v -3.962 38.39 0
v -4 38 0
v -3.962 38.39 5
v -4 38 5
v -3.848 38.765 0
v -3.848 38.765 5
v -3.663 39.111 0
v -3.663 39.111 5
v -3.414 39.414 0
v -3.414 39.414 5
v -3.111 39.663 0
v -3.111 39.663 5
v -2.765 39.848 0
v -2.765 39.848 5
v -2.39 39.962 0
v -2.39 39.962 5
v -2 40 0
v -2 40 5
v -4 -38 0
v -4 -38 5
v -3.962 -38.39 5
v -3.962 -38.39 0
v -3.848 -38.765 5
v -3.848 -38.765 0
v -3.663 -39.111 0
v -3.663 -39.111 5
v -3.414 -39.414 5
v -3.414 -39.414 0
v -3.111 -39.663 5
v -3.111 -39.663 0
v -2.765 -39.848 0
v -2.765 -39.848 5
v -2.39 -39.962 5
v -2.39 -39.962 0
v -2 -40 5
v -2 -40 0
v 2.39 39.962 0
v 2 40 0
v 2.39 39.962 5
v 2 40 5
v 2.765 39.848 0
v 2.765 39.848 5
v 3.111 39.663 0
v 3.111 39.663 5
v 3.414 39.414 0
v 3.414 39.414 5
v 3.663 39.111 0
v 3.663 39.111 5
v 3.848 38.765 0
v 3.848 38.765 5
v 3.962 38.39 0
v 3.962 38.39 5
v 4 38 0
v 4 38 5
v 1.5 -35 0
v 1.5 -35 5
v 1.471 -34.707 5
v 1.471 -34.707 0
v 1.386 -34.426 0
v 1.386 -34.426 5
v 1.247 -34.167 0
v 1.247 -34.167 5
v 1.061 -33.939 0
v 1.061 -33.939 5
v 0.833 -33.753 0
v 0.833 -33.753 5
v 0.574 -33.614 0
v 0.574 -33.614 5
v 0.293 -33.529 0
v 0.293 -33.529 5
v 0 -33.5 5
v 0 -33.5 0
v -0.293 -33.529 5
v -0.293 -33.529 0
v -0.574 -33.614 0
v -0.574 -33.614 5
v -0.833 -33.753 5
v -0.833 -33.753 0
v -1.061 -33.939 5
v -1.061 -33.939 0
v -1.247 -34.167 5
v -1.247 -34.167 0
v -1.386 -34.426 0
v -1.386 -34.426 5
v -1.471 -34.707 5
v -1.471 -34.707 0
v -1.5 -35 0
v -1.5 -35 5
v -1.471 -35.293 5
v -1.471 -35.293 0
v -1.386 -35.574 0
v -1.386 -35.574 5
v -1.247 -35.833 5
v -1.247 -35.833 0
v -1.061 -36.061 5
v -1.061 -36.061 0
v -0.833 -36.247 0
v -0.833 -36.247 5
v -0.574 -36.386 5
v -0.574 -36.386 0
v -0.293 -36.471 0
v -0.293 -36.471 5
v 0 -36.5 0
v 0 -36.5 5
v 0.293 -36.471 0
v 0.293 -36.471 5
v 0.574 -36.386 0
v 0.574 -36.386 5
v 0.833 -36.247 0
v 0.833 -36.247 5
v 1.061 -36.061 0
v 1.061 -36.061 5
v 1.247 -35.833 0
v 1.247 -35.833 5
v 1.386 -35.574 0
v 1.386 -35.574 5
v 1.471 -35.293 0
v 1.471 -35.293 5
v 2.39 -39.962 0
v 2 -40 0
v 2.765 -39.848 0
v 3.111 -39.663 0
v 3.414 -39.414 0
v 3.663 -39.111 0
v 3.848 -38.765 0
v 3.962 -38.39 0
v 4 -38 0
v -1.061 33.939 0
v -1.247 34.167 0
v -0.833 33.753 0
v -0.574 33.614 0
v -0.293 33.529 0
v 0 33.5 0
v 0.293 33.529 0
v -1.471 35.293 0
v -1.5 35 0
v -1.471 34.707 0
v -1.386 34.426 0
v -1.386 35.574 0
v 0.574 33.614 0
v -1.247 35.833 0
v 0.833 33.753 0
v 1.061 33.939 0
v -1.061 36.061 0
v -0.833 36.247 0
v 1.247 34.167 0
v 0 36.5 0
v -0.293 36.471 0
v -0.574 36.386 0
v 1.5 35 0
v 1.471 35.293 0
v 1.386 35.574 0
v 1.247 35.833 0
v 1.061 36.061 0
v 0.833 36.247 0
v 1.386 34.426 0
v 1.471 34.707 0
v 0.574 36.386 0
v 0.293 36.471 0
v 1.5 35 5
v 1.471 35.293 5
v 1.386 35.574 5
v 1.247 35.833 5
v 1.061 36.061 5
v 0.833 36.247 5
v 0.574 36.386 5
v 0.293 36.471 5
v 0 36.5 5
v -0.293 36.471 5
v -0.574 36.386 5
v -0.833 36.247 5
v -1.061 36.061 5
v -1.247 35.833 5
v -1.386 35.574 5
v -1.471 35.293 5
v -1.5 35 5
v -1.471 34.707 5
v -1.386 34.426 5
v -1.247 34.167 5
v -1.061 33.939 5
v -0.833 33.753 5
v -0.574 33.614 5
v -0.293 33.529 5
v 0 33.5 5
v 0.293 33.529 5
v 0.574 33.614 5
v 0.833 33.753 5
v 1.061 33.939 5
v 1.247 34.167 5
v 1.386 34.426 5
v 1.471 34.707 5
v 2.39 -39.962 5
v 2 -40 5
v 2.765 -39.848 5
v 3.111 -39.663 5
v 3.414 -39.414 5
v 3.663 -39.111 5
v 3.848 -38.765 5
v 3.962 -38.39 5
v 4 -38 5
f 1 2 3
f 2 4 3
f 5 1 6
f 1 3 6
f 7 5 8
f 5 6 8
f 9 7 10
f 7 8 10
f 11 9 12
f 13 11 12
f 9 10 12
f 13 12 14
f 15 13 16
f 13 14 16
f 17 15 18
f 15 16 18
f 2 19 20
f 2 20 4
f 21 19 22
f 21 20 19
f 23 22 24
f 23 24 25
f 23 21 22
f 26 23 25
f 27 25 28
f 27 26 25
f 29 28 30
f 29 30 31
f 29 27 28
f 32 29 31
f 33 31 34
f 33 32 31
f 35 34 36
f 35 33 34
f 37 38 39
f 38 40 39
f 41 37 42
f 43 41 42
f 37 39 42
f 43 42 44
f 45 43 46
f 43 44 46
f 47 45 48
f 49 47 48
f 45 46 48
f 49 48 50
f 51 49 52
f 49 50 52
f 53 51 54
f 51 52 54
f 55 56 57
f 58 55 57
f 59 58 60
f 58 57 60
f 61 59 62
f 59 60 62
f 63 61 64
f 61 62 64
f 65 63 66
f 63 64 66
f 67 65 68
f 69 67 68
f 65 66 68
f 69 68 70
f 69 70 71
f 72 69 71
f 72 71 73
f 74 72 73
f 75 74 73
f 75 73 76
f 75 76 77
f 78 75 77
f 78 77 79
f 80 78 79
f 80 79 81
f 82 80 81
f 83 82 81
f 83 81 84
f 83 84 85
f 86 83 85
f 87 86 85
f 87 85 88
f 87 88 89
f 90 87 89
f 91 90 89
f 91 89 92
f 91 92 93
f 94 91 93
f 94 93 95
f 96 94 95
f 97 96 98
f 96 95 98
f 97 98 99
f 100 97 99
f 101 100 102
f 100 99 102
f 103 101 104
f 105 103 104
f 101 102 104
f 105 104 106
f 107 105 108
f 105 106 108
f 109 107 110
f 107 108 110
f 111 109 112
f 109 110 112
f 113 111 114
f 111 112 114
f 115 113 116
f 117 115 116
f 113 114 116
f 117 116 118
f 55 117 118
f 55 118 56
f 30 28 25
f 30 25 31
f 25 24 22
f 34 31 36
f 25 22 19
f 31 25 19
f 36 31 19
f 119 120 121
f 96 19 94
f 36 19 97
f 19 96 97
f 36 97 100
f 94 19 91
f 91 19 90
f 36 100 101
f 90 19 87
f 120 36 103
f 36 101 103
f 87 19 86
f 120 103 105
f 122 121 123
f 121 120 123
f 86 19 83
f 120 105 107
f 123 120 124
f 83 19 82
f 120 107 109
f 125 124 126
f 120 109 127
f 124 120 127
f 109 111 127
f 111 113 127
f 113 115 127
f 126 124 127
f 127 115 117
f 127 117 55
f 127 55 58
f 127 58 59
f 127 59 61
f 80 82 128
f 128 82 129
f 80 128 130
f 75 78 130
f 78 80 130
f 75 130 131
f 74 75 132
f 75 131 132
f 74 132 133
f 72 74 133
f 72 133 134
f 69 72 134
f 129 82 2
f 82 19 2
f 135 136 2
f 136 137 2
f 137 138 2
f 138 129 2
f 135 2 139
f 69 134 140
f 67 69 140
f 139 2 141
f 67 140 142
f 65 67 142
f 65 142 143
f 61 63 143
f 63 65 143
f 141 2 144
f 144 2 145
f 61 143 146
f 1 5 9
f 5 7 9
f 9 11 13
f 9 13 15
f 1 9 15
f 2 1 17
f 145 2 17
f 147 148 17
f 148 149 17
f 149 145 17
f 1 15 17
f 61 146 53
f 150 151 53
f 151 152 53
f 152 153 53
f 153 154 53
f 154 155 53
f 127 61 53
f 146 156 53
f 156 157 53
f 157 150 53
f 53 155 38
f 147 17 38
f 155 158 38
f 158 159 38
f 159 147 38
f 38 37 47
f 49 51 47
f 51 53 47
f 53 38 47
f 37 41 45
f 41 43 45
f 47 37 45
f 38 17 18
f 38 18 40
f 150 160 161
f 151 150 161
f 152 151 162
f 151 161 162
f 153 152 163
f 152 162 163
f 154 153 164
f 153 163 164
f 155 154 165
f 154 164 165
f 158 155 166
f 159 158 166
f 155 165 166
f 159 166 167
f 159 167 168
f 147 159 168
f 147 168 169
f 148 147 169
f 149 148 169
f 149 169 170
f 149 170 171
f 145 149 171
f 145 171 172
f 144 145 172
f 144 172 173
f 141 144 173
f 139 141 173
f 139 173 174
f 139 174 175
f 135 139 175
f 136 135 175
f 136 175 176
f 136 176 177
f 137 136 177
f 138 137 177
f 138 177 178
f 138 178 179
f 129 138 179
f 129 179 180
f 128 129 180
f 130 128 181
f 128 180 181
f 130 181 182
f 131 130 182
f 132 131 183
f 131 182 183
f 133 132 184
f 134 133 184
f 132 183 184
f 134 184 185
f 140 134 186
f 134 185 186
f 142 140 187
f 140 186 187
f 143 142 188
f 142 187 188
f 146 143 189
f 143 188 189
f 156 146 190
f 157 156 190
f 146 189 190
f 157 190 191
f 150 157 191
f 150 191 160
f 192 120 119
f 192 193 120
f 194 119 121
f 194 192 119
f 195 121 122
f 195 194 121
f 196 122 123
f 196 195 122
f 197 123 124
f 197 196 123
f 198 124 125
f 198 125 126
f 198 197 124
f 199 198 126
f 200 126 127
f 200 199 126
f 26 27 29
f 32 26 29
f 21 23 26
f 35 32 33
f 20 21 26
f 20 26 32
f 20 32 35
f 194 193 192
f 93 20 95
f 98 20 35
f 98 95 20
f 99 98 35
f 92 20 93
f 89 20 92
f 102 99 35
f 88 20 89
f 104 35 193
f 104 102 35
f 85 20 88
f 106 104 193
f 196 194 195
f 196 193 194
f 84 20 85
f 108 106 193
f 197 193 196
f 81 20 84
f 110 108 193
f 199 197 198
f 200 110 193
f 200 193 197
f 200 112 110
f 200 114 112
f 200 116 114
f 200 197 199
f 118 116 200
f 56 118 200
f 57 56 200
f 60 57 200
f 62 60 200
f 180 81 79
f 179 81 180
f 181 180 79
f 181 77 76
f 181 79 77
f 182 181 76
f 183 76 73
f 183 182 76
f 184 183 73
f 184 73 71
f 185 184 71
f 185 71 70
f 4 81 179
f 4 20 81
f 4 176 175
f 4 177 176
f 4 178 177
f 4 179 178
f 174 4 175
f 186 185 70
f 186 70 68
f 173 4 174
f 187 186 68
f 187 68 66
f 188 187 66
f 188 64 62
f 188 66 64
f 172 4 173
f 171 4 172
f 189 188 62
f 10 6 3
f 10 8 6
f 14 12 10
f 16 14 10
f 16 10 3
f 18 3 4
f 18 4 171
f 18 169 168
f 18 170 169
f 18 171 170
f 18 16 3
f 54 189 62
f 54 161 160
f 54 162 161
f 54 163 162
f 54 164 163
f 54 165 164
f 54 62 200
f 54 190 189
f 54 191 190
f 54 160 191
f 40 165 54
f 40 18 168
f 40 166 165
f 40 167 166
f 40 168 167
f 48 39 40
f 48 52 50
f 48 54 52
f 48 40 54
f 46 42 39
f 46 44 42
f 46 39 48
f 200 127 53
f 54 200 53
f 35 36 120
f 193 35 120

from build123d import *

# Parameters (mm, degrees)
SKETCH_1_W          = 8
SKETCH_1_H          = 80
EXTRUDE_1_DEPTH     = 5
SKETCH_2_R          = 1.5
CUT_EXTRUDE_1_DEPTH = 41.509258201
FILLET_1_R          = 2


with BuildPart() as part:
    # 草图1 → 凸台-拉伸1 (new body)
    with BuildSketch(Plane.XY):
        Rectangle(SKETCH_1_W, SKETCH_1_H)
    extrude(amount=EXTRUDE_1_DEPTH)

    # 草图2 → 切除-拉伸1 (cut, through all)
    with BuildSketch(Plane.XY.offset(5)):
        with Locations((0, 35)):
            Circle(SKETCH_2_R)
        with Locations((0, -35)):
            Circle(SKETCH_2_R)
    extrude(amount=-CUT_EXTRUDE_1_DEPTH, mode=Mode.SUBTRACT)

    # 圆角1
    fillet_1_edges = [part.edges().sort_by_distance(p)[0] for p in [
        (-4, 40, 2.5),
        (4, 40, 2.5),
        (4, -40, 2.5),
        (-4, -40, 2.5),
    ]]
    fillet(fillet_1_edges, radius=FILLET_1_R)


solid = part.part
